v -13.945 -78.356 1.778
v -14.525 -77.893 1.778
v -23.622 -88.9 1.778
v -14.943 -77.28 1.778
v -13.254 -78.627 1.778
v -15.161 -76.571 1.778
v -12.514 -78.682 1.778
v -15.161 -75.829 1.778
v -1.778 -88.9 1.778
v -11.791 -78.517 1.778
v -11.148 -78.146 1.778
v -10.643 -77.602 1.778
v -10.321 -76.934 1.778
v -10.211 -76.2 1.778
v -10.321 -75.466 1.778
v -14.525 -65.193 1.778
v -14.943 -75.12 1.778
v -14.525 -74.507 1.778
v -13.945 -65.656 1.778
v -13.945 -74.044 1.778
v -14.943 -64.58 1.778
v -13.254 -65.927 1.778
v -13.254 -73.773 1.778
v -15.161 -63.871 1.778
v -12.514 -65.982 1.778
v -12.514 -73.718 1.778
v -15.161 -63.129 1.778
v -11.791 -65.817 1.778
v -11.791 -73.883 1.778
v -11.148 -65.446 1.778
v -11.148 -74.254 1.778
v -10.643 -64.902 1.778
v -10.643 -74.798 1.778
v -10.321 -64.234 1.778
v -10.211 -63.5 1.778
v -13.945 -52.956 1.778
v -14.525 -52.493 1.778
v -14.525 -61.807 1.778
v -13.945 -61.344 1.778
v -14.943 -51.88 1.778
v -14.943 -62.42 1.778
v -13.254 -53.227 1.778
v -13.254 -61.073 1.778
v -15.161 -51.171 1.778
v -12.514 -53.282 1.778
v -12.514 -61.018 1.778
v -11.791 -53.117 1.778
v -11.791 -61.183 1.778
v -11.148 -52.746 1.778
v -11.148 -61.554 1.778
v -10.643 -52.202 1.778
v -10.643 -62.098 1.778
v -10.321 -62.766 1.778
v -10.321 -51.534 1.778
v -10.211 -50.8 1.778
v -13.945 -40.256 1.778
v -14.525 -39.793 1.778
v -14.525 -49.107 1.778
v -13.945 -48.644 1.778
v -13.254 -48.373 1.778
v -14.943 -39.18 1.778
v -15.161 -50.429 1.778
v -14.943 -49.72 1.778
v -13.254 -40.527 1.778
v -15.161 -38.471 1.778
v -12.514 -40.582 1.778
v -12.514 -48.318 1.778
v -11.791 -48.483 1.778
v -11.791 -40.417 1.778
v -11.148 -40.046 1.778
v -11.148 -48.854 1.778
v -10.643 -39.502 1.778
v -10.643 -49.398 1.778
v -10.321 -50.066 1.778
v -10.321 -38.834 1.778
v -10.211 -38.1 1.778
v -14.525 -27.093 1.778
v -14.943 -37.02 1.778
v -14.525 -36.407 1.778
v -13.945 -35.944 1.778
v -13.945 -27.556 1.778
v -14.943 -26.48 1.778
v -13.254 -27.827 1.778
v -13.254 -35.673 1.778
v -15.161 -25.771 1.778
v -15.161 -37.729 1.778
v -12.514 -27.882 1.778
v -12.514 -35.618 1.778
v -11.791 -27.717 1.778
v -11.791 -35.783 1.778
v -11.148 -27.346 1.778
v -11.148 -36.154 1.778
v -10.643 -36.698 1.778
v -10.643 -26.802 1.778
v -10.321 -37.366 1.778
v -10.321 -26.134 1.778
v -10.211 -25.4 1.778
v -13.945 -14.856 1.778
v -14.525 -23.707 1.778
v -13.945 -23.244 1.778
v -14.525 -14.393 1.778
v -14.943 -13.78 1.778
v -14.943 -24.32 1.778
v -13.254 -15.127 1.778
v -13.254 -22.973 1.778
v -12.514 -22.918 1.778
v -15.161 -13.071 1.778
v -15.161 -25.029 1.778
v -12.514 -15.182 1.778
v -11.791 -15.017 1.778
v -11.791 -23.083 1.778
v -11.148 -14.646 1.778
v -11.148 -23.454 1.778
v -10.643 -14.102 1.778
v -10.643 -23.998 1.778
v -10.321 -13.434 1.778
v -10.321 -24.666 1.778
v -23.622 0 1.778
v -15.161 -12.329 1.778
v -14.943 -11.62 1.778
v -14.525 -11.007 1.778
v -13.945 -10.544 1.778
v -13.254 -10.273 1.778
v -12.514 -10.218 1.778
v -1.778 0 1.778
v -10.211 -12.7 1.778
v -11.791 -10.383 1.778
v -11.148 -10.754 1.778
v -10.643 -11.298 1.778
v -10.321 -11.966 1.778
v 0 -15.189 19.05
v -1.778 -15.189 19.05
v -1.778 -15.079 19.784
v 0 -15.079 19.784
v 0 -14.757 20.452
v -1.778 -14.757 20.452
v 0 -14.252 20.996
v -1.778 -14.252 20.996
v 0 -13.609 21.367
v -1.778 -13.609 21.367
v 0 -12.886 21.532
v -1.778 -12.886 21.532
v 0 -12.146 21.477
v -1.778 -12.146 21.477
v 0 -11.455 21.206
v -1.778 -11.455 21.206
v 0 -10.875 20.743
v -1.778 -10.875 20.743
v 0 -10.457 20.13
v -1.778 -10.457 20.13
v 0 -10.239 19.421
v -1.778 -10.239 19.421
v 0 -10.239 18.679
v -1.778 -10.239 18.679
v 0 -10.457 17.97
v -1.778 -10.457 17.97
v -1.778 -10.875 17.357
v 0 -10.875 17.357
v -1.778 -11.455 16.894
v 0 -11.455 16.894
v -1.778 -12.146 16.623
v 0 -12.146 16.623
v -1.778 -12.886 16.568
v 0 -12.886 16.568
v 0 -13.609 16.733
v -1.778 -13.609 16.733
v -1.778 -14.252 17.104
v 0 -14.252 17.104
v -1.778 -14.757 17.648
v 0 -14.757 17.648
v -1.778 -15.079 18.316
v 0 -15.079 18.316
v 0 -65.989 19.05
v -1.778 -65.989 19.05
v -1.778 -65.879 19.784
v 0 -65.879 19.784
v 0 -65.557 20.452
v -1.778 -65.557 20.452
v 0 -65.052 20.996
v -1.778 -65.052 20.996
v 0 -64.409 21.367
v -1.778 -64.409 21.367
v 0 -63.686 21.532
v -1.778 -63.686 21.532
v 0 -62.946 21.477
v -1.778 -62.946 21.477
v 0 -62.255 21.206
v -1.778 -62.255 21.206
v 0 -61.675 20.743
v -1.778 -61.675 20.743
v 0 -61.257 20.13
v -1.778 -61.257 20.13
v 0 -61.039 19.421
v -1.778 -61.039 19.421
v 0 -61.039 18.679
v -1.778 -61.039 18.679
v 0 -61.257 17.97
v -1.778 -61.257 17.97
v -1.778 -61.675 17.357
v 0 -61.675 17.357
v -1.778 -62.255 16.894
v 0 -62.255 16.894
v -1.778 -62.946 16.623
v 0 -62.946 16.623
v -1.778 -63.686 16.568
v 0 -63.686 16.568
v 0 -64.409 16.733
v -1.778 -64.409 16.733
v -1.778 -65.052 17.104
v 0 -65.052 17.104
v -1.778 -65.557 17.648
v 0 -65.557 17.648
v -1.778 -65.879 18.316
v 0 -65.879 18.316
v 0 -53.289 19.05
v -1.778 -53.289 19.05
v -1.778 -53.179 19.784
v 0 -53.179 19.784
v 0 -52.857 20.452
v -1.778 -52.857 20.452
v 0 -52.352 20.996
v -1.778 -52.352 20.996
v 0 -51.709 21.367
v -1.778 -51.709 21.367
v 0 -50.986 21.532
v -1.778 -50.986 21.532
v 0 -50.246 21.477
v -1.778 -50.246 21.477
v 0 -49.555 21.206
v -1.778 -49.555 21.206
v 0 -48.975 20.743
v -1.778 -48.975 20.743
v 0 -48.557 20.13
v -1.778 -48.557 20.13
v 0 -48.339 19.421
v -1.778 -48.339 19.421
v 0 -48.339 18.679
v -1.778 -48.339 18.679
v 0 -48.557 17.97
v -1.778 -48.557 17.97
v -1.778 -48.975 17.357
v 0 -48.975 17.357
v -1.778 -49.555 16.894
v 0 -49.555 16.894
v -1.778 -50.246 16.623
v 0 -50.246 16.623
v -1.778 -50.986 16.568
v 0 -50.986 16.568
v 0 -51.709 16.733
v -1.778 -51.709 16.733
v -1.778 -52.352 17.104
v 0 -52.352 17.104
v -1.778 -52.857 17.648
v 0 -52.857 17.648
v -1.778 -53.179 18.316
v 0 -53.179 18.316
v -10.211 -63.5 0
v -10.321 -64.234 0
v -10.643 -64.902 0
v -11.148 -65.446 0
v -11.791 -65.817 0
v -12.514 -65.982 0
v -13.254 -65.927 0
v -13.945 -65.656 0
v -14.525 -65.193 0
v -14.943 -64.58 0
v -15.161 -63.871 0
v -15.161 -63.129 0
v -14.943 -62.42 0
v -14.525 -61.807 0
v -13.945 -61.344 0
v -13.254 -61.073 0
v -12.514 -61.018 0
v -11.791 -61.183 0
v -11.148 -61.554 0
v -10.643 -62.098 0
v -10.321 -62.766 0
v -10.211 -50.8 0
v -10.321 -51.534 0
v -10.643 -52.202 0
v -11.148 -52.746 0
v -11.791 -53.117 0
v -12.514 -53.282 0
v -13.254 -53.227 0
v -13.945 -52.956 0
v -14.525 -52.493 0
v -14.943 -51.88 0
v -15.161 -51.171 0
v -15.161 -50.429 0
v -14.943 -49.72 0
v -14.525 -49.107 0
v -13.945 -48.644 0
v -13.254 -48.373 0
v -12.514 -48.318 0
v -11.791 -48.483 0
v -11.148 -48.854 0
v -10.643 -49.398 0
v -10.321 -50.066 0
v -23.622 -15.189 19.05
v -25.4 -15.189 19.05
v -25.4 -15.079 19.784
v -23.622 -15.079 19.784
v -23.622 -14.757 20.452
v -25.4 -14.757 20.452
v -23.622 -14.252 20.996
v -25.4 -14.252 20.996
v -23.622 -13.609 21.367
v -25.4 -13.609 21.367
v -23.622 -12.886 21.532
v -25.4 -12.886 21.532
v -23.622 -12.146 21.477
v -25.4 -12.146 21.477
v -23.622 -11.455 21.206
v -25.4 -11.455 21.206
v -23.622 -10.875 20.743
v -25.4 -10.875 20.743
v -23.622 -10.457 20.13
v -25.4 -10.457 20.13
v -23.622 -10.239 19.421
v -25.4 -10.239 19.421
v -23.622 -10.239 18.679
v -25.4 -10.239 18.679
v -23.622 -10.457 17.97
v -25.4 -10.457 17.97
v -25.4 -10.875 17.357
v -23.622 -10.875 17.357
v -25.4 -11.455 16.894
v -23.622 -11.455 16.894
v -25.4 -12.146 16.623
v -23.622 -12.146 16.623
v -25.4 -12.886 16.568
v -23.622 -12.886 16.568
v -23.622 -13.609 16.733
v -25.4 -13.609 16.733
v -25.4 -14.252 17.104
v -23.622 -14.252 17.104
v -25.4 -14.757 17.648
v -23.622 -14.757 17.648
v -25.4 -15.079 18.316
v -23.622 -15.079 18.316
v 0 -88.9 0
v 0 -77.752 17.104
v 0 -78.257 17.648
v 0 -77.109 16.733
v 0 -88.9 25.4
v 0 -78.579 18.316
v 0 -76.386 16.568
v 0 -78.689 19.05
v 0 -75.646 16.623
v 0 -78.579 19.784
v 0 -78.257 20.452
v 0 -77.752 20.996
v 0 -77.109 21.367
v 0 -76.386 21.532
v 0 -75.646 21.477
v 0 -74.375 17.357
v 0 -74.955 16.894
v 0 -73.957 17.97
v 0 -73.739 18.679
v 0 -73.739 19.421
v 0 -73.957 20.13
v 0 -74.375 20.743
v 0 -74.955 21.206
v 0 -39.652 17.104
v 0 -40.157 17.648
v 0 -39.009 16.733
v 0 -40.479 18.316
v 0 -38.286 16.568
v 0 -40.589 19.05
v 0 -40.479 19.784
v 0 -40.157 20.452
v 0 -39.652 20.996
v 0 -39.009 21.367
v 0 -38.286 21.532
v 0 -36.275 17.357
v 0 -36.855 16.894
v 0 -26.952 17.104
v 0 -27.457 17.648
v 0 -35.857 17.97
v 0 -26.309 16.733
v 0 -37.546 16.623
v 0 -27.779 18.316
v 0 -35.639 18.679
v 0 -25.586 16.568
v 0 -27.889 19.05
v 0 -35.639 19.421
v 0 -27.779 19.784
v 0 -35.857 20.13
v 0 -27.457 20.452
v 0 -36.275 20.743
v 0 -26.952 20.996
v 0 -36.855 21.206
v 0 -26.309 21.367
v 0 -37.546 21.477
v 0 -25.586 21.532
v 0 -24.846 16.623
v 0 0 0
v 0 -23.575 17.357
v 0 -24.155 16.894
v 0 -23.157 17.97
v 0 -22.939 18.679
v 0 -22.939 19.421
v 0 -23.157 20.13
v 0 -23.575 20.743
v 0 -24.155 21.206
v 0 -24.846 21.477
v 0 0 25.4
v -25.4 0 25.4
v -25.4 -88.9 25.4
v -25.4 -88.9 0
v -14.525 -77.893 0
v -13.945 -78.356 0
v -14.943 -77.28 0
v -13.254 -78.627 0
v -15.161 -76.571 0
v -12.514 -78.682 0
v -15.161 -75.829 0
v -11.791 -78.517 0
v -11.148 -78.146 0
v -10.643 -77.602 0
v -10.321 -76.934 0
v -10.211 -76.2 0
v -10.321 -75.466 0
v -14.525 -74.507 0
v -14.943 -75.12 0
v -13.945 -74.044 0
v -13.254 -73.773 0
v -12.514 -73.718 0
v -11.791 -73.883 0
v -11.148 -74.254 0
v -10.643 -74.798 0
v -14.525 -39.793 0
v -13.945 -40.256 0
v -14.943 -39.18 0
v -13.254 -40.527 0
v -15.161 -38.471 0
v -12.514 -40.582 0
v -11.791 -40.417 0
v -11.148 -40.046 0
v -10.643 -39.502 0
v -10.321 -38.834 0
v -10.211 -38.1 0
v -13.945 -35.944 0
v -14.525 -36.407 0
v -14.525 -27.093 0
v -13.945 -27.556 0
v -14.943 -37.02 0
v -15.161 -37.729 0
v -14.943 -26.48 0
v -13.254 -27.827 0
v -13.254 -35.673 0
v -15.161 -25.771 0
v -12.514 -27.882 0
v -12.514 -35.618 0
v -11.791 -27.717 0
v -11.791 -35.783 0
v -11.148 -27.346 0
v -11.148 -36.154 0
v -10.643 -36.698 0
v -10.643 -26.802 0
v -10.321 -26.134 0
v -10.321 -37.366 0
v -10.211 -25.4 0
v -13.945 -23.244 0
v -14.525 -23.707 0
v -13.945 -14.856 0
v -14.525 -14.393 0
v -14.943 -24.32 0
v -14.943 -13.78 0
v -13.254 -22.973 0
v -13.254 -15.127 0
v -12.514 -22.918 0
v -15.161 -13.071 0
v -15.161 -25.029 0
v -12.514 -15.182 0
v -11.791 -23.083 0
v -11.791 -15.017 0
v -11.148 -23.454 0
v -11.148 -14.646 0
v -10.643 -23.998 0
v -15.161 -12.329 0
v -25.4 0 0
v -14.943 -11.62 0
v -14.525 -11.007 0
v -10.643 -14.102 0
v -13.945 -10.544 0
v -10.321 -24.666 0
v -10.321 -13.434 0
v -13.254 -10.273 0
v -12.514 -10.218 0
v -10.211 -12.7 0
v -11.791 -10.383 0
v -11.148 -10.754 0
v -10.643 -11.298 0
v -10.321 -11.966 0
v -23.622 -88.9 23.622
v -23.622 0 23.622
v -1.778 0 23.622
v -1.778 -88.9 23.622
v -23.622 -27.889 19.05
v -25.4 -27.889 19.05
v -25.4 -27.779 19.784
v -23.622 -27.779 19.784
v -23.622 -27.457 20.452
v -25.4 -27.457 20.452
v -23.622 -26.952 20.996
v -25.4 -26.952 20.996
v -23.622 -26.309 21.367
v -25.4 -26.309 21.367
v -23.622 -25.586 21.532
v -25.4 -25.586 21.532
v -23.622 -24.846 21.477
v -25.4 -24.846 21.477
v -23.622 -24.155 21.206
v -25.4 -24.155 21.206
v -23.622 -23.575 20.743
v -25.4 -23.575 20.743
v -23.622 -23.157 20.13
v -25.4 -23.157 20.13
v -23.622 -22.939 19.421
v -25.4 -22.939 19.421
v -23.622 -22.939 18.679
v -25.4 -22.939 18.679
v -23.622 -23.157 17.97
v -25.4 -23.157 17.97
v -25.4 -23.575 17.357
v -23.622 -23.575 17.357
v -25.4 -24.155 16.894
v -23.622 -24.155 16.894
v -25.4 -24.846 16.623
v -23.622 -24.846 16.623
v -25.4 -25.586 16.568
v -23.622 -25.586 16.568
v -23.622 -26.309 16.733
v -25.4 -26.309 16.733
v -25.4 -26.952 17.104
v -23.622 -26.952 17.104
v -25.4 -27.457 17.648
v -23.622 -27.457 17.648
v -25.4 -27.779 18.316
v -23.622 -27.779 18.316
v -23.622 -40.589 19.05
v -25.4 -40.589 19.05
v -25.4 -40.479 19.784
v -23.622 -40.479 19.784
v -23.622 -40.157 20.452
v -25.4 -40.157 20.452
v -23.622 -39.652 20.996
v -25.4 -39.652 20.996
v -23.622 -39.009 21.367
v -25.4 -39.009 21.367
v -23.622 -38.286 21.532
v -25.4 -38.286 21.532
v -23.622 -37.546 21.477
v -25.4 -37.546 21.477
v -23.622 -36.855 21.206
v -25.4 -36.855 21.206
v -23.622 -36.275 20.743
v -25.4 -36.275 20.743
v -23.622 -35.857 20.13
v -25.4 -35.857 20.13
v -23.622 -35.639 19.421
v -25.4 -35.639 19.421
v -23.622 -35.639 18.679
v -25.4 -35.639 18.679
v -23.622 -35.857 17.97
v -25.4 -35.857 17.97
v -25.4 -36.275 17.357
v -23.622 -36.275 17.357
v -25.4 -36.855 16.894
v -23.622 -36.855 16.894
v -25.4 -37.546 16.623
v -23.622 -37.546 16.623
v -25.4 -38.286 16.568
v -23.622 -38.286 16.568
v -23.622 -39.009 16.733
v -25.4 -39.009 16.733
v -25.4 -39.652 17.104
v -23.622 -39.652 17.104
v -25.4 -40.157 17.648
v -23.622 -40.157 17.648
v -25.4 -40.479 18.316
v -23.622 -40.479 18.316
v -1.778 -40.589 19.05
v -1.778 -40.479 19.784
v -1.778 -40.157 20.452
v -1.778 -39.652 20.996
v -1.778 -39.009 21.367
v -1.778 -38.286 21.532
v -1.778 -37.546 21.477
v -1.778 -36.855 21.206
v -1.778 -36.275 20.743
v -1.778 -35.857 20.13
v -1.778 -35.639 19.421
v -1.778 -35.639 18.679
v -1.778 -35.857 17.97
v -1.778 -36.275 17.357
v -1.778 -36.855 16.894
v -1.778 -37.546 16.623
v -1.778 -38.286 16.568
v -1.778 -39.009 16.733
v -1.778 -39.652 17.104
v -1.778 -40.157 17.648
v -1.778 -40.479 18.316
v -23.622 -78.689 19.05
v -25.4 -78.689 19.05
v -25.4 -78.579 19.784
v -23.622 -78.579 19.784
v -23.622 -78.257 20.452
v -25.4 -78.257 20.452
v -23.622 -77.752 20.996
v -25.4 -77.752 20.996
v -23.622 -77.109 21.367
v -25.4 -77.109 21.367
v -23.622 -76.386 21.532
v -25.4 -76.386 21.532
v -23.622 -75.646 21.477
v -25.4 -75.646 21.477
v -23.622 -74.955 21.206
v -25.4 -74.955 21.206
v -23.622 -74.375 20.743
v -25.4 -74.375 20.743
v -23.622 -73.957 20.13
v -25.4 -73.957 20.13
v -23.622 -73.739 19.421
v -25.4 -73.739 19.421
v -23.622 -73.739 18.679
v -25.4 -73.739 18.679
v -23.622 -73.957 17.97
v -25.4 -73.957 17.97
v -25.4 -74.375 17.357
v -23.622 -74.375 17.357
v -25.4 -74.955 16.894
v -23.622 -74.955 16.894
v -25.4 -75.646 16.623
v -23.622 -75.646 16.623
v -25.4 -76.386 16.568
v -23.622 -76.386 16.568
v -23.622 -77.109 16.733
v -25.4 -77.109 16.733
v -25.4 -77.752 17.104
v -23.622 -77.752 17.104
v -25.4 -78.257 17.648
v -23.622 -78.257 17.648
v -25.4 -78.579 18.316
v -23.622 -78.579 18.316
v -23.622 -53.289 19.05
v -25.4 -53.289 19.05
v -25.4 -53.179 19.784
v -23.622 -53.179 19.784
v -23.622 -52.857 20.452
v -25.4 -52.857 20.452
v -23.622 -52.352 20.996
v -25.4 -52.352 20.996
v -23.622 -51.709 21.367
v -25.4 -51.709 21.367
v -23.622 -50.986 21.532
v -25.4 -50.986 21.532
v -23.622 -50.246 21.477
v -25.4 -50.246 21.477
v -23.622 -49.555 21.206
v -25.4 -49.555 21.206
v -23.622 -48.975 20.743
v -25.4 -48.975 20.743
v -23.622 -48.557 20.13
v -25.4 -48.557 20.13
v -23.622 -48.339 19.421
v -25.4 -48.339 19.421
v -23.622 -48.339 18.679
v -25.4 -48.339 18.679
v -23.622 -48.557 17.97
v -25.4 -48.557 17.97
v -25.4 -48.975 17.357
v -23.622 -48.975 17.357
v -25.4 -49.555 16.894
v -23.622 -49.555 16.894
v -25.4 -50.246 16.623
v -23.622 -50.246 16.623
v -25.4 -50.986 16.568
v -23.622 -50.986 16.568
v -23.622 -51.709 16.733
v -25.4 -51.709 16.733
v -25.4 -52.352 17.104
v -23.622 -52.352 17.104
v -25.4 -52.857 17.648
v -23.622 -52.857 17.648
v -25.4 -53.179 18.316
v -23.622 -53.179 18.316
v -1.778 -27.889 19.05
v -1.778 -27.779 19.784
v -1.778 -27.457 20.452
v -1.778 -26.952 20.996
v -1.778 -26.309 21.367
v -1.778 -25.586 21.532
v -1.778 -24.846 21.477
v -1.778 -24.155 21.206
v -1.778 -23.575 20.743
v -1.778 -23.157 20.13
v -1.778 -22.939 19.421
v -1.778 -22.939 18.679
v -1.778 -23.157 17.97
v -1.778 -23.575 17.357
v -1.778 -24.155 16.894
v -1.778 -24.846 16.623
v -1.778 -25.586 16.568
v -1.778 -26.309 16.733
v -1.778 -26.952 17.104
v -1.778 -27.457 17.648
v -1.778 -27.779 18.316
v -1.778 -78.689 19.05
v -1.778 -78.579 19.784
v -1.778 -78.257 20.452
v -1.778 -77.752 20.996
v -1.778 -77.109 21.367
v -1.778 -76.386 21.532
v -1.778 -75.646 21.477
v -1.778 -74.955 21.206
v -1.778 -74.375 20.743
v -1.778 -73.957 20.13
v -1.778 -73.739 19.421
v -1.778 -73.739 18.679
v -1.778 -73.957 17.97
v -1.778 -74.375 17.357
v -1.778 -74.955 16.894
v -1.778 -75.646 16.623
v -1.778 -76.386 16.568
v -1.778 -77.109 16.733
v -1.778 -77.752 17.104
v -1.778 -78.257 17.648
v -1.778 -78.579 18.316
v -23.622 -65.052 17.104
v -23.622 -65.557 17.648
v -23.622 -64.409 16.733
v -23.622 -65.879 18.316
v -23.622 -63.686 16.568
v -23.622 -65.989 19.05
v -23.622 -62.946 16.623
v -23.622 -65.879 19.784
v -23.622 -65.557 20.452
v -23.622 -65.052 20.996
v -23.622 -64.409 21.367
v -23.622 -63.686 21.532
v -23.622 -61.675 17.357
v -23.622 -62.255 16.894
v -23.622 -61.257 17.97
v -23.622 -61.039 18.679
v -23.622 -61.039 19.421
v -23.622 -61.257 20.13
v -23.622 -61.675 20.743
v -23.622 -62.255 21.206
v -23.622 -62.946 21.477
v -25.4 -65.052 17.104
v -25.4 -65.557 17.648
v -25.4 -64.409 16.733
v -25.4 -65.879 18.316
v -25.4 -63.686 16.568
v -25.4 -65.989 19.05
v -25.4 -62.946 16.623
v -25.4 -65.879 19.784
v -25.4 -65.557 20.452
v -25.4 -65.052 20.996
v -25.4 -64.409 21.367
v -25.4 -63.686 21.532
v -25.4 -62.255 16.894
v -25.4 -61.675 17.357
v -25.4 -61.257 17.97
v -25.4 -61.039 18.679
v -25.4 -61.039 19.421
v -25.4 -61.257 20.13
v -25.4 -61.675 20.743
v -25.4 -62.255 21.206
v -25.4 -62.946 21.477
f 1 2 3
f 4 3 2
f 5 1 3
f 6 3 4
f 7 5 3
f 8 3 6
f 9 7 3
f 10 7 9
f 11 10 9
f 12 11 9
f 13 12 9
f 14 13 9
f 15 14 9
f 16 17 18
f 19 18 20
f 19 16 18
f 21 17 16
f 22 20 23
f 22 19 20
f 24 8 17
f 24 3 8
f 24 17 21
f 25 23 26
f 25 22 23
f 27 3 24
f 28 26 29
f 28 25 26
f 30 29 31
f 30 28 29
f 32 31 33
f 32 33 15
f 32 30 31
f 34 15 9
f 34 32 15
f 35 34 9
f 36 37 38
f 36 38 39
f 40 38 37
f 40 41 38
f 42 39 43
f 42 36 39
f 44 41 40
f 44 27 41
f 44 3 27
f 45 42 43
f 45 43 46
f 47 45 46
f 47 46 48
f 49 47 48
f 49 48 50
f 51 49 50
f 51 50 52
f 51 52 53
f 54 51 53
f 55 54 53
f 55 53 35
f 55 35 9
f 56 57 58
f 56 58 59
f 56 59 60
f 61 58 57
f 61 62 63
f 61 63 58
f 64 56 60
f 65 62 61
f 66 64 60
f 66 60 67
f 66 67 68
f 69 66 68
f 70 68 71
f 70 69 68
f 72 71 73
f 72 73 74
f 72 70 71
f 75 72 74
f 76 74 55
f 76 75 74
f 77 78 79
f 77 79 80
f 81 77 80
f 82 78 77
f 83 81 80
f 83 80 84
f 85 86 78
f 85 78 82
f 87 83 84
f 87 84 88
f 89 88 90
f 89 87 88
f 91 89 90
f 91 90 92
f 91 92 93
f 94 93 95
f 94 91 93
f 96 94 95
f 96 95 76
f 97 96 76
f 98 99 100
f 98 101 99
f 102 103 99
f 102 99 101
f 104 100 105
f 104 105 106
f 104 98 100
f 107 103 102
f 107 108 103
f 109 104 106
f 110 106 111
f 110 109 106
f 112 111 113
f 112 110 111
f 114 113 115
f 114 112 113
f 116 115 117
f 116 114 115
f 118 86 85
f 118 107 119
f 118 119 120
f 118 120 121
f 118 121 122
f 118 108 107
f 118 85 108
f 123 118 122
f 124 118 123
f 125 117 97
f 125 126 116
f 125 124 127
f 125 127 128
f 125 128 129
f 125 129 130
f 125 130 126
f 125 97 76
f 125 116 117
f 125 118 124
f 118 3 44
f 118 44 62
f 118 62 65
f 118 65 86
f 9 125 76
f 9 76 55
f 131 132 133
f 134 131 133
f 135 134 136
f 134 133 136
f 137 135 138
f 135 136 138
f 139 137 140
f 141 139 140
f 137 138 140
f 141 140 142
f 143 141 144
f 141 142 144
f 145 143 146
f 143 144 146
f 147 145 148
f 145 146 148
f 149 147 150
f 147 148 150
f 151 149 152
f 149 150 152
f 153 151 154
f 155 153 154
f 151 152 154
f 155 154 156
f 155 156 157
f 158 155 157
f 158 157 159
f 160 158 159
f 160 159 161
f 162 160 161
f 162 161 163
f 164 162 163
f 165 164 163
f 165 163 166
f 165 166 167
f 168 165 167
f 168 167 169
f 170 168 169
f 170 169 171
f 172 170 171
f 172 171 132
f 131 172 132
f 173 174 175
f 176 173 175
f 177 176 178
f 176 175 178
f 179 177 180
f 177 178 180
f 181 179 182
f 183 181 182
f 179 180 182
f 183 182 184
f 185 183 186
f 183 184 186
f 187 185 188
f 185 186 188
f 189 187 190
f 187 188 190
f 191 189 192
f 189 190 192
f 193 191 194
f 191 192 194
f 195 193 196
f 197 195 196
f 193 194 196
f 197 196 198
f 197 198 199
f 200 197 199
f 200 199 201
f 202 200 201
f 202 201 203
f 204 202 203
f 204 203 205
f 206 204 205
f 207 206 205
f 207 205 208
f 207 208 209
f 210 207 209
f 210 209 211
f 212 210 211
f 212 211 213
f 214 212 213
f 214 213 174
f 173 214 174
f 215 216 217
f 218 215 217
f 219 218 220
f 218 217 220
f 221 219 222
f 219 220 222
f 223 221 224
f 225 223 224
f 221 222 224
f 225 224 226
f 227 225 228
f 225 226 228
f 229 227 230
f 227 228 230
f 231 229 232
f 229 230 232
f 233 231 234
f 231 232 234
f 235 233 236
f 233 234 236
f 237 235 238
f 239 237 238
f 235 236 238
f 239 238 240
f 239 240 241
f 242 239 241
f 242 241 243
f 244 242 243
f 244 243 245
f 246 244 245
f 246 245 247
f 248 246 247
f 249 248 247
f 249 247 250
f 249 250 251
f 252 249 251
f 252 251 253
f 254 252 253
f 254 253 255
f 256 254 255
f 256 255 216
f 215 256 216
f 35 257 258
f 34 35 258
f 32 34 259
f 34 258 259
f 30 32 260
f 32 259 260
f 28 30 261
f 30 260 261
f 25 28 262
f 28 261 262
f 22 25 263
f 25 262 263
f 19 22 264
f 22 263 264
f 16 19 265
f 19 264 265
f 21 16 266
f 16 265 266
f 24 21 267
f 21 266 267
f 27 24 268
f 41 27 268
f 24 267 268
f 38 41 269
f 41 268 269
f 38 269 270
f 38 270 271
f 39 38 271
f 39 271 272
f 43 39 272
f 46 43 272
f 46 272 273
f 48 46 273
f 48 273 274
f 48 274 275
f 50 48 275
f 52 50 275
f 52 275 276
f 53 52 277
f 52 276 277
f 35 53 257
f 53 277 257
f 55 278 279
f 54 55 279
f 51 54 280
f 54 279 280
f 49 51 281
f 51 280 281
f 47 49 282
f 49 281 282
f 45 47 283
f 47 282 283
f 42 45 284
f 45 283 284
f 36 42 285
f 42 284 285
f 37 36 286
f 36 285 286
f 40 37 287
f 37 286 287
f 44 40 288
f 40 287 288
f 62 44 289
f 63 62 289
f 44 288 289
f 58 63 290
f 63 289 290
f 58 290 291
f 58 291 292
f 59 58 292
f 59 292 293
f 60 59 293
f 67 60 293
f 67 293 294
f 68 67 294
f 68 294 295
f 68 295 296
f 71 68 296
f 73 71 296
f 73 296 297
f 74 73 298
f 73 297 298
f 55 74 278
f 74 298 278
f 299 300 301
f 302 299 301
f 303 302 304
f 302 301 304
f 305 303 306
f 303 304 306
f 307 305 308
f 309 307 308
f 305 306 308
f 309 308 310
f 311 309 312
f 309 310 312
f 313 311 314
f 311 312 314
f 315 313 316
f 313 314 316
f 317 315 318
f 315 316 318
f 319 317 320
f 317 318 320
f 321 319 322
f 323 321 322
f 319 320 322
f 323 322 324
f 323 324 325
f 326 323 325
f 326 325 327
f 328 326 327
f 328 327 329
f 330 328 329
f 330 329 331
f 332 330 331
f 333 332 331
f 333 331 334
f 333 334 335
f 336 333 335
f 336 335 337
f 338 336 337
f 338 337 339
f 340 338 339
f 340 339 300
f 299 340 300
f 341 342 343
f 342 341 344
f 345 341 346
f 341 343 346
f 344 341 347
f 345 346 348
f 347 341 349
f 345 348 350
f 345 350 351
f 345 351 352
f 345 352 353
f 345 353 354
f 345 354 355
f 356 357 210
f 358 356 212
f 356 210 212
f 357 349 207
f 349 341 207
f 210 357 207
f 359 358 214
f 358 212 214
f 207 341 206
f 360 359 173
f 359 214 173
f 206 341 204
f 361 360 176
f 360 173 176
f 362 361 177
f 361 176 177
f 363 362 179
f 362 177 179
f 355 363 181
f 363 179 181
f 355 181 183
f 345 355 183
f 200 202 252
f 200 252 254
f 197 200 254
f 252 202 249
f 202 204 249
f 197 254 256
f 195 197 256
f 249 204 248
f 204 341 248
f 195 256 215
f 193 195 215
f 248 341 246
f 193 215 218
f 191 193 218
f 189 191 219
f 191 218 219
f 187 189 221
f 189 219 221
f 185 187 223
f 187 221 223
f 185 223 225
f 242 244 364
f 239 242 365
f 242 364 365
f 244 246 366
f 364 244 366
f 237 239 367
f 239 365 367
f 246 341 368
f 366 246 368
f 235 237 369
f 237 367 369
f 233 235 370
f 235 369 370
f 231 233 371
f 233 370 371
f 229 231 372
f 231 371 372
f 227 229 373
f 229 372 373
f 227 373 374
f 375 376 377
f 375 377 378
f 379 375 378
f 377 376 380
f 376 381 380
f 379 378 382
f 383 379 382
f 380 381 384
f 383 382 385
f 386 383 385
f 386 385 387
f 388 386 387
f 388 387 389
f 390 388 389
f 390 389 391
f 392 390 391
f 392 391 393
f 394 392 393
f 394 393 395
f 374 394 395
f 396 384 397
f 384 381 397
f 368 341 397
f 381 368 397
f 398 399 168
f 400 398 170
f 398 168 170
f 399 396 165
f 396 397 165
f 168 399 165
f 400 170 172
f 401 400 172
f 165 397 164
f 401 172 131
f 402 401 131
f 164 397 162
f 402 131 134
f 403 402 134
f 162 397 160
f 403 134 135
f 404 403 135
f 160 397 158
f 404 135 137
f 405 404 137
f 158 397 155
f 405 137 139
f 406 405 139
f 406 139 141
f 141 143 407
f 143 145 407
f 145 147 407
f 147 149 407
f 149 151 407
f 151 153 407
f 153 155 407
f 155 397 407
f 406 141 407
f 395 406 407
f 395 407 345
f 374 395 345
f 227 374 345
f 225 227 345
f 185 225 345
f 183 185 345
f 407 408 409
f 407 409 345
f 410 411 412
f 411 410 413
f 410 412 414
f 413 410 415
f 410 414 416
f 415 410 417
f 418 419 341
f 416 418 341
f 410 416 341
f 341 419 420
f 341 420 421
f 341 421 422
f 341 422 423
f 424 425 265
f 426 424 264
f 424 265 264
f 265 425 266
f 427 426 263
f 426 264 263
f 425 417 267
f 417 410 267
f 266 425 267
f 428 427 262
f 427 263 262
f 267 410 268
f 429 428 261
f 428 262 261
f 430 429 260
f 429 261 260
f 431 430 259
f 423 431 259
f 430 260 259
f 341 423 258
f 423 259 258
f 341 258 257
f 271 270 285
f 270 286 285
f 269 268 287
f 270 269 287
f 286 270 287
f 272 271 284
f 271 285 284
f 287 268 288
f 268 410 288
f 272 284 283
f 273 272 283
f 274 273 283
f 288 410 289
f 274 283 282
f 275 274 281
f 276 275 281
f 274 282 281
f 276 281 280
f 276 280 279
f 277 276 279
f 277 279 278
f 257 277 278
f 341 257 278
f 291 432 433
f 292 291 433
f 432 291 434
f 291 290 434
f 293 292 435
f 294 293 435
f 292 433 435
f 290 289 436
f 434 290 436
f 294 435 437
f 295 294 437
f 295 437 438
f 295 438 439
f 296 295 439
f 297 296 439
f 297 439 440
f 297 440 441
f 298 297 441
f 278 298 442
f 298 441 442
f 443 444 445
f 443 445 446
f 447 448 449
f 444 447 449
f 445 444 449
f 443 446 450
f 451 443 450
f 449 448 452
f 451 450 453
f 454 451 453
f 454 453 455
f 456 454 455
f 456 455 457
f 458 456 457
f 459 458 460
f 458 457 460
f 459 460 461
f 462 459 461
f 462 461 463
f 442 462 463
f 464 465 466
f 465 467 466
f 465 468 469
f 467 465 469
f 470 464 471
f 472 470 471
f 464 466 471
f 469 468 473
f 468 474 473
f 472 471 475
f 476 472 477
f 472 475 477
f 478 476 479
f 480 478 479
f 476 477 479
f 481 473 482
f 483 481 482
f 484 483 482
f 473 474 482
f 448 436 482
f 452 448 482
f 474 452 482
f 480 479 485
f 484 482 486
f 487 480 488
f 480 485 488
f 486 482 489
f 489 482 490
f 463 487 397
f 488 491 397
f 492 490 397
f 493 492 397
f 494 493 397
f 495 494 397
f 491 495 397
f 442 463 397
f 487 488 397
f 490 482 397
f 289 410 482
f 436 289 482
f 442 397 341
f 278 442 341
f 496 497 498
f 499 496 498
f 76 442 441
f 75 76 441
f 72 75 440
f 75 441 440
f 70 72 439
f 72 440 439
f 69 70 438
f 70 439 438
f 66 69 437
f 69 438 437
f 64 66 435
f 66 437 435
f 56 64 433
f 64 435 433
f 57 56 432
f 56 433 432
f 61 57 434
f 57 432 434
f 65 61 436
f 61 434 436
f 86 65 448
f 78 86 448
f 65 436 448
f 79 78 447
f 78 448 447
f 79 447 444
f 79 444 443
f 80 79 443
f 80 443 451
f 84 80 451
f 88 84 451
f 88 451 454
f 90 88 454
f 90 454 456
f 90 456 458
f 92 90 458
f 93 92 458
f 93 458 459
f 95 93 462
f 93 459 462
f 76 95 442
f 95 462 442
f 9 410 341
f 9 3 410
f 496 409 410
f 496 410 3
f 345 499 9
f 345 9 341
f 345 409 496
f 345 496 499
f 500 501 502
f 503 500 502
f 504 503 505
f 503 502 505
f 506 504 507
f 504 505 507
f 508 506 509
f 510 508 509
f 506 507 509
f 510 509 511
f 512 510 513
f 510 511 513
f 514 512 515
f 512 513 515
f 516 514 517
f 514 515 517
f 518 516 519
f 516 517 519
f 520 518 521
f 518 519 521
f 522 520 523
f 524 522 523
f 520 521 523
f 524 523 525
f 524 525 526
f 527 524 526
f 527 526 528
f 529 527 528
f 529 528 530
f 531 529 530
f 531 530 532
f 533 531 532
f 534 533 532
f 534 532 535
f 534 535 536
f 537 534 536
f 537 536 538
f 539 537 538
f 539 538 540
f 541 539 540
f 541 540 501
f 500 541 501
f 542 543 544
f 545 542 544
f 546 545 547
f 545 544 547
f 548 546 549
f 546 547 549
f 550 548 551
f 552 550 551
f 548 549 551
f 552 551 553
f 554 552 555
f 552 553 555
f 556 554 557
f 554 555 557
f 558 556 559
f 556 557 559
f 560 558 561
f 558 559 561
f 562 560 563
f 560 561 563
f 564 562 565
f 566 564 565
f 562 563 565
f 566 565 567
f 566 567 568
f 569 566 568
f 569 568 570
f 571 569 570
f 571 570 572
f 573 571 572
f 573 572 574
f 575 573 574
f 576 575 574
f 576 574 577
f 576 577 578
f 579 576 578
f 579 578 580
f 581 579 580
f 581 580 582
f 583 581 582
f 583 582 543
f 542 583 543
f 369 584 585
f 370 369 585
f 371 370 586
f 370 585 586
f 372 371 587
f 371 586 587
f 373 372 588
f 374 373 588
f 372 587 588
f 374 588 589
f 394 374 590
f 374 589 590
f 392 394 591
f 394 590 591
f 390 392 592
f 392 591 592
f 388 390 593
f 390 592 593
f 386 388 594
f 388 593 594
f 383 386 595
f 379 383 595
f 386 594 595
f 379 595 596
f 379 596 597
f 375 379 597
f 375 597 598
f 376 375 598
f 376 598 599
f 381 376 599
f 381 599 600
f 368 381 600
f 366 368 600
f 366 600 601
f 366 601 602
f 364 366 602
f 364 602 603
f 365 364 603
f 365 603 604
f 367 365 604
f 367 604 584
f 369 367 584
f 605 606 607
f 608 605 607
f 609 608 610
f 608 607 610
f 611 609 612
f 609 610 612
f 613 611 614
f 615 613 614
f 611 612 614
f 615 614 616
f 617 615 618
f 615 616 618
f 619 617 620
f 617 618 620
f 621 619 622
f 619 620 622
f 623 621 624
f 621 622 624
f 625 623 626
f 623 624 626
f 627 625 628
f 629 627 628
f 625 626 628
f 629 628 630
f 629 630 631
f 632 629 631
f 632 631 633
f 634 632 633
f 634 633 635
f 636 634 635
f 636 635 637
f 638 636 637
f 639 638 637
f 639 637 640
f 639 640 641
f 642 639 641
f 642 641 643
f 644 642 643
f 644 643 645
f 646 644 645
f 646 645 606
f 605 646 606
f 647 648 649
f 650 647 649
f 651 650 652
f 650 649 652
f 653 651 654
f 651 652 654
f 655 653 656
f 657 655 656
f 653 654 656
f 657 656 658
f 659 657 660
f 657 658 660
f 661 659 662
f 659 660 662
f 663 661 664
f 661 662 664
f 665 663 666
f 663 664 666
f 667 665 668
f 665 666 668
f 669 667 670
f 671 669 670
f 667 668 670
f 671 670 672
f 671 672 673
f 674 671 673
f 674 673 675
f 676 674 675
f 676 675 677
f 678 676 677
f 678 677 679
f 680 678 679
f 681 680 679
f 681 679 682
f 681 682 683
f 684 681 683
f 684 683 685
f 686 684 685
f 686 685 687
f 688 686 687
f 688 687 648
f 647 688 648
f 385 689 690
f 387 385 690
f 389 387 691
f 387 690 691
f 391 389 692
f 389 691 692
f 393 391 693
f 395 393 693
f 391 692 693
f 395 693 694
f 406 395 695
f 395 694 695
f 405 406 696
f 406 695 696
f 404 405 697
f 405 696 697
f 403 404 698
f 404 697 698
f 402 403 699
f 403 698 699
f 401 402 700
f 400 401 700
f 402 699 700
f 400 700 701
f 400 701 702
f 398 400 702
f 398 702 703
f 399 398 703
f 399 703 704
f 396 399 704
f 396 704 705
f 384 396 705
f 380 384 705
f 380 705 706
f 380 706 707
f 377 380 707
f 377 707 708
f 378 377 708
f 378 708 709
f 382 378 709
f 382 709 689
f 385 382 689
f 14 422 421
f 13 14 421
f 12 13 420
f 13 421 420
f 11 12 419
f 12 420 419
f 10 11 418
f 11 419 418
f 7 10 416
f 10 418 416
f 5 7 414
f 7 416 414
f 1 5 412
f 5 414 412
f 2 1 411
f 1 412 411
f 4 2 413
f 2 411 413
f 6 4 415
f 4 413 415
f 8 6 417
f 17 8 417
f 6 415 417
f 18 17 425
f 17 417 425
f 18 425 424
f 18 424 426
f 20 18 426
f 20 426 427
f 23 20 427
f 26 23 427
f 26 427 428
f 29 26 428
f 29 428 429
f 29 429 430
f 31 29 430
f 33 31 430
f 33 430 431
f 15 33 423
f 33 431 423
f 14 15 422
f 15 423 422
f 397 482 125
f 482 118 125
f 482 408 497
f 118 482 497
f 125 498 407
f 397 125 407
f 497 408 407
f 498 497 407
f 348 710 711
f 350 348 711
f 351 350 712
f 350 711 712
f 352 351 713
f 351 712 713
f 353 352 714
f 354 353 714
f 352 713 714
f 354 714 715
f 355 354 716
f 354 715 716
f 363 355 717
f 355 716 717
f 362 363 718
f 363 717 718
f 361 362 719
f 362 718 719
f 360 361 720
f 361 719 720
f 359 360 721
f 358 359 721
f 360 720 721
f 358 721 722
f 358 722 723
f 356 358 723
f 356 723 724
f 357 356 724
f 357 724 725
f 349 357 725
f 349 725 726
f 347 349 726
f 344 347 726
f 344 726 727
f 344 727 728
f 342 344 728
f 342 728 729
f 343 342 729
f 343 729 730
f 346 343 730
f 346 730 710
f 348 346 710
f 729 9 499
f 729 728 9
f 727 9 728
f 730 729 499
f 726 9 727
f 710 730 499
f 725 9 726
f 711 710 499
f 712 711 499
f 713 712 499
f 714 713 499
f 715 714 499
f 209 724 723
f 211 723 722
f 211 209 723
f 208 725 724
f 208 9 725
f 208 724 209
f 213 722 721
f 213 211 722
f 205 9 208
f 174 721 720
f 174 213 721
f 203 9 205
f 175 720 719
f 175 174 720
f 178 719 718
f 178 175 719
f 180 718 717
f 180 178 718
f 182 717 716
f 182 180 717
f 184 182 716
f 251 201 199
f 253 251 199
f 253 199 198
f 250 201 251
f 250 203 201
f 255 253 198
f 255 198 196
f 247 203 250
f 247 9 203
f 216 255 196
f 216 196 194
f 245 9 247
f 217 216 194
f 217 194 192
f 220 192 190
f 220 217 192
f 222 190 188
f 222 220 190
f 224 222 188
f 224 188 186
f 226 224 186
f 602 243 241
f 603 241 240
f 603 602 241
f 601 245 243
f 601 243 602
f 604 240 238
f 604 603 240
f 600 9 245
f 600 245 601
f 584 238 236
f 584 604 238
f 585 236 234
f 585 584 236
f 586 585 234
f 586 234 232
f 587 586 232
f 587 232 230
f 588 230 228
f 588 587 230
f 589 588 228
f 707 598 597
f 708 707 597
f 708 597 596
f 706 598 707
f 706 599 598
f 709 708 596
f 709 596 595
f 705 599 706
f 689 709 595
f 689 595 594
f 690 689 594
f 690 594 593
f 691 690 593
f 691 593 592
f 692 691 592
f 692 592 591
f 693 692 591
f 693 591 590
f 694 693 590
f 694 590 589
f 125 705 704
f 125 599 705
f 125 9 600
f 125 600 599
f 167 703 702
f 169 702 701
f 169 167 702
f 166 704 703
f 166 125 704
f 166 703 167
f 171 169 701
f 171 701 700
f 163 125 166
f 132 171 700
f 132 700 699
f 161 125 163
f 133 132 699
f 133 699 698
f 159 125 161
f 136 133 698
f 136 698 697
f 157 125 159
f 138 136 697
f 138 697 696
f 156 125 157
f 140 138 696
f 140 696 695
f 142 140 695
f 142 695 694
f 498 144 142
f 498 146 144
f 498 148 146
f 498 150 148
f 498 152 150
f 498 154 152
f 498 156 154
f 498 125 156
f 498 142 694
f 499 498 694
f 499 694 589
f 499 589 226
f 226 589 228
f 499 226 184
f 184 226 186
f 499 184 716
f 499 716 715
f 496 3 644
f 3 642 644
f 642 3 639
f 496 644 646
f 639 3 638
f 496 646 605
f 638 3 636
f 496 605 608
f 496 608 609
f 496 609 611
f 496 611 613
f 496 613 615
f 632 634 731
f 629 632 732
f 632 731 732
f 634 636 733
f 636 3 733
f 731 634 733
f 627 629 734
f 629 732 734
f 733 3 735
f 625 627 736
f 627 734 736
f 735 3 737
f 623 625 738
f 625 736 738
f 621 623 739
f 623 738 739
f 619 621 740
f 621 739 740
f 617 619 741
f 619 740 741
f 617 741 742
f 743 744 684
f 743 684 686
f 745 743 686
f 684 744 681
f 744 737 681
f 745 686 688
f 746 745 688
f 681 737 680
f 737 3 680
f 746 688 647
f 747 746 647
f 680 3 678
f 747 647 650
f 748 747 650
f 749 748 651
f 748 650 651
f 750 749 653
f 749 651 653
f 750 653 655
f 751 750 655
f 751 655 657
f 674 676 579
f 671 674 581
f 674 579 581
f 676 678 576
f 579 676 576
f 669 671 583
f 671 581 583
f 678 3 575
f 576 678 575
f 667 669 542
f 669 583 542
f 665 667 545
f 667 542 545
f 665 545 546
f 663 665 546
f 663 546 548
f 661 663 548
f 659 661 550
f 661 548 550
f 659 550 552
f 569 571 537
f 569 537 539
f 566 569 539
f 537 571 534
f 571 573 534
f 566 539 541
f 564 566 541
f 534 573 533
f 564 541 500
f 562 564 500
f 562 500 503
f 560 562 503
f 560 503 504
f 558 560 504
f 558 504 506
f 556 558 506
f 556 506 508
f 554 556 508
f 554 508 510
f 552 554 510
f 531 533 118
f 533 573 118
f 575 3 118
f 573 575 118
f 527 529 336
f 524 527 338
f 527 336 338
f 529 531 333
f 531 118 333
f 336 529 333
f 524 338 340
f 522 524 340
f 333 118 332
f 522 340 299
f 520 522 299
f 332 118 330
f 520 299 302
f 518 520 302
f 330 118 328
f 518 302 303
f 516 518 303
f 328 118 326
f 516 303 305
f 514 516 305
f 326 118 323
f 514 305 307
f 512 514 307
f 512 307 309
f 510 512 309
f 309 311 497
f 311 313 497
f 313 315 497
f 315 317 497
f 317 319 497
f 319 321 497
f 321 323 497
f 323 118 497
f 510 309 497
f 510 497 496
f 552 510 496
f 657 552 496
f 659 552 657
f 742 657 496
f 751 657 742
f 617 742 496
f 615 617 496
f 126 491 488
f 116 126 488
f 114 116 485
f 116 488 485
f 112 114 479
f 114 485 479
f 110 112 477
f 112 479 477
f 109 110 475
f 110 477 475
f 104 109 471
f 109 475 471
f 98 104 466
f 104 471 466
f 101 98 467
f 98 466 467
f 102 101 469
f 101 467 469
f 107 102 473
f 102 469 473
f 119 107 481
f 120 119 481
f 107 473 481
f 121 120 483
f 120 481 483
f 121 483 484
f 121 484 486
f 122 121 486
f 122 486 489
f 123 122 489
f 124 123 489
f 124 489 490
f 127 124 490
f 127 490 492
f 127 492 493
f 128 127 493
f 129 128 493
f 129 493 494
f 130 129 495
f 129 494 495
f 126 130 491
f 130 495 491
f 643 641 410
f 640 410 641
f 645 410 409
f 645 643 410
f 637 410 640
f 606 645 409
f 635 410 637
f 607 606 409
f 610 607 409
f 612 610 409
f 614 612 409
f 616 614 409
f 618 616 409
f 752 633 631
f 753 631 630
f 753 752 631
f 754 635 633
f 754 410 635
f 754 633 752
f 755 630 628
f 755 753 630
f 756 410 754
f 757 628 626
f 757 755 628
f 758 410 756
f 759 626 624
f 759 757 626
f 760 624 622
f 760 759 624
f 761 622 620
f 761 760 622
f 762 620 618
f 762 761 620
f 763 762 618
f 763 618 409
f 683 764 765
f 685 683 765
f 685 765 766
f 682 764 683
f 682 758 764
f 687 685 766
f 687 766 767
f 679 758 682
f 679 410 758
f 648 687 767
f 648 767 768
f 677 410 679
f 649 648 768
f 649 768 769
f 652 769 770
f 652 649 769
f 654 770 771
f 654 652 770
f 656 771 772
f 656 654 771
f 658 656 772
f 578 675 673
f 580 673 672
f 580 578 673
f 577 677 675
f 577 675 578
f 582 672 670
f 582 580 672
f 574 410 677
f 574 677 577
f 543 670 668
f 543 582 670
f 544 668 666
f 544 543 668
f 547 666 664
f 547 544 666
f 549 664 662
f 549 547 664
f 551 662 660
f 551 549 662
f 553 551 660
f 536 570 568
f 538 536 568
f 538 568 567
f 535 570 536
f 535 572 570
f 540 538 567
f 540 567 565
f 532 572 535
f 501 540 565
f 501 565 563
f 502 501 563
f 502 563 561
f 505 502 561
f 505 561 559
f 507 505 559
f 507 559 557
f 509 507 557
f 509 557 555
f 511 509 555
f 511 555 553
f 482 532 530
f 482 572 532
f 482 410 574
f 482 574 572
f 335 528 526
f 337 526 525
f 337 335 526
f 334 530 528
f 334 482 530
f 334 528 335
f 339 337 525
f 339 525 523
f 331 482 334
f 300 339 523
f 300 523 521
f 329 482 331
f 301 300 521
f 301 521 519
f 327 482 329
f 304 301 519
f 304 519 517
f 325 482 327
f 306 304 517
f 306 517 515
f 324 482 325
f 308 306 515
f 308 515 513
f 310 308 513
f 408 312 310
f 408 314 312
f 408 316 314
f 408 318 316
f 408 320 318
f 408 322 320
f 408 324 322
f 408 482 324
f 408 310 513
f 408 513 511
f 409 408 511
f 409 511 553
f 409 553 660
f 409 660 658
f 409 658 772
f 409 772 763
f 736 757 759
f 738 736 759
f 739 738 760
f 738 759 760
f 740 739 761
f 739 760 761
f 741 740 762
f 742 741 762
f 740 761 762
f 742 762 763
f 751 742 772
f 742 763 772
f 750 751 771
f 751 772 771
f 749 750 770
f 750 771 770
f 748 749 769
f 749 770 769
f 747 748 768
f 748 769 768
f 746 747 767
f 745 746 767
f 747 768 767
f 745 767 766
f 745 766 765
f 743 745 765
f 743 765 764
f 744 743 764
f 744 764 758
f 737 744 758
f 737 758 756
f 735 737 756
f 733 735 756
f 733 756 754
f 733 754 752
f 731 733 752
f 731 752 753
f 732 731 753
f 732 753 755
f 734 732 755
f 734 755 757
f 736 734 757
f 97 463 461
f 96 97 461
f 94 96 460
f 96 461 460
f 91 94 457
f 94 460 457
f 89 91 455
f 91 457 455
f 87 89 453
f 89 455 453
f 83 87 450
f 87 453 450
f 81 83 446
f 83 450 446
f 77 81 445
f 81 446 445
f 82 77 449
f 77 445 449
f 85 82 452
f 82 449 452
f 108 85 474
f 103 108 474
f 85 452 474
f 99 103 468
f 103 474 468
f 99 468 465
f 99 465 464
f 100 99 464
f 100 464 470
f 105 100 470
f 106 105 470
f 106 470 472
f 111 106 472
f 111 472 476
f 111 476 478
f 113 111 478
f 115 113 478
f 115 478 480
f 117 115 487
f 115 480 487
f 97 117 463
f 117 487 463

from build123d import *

# Parameters (mm, degrees)
F0_W     = 25.4
F0_H     = 25.4
F0_W_2   = 21.844
F0_H_2   = 21.844
F1_DEPTH = 88.9
F2_R     = 2.4892
F3_DEPTH = 25.4
F4_R     = 2.4892
F5_DEPTH = 1.778


with BuildPart() as f1:
    # F0 (on Front) → F1 (new body)
    with BuildSketch(Plane.XZ):
        with Locations((-12.7, 12.7)):
            Rectangle(F0_W, F0_H)
        with Locations((-12.7, 12.7)):
            Rectangle(F0_W_2, F0_H_2, mode=Mode.SUBTRACT)
    extrude(amount=F1_DEPTH)

    # F2 (on face) → F3 (cut)
    with BuildSketch(Plane(origin=(-25.4, 0, 0), x_dir=(0, -1, 0), z_dir=(-1, 0, 0))):
        with Locations((12.7, 19.05)):
            Circle(F2_R)
        with Locations((25.4, 19.05)):
            Circle(F2_R)
        with Locations((38.1, 19.05)):
            Circle(F2_R)
        with Locations((50.8, 19.05)):
            Circle(F2_R)
        with Locations((63.5, 19.05)):
            Circle(F2_R)
        with Locations((76.2, 19.05)):
            Circle(F2_R)
    extrude(amount=-F3_DEPTH, mode=Mode.SUBTRACT)

    # F4 (on face) → F5 (cut, through all)
    with BuildSketch(Plane(origin=(0, 0, 0), x_dir=(1, 0, 0), z_dir=(0, 0, -1))):
        with Locations((-12.7, 76.2)):
            Circle(F4_R)
        with Locations((-12.7, 63.5)):
            Circle(F4_R)
        with Locations((-12.7, 50.8)):
            Circle(F4_R)
        with Locations((-12.7, 38.1)):
            Circle(F4_R)
        with Locations((-12.7, 25.4)):
            Circle(F4_R)
        with Locations((-12.7, 12.7)):
            Circle(F4_R)
    extrude(amount=-F5_DEPTH, mode=Mode.SUBTRACT)


solid = f1.part
